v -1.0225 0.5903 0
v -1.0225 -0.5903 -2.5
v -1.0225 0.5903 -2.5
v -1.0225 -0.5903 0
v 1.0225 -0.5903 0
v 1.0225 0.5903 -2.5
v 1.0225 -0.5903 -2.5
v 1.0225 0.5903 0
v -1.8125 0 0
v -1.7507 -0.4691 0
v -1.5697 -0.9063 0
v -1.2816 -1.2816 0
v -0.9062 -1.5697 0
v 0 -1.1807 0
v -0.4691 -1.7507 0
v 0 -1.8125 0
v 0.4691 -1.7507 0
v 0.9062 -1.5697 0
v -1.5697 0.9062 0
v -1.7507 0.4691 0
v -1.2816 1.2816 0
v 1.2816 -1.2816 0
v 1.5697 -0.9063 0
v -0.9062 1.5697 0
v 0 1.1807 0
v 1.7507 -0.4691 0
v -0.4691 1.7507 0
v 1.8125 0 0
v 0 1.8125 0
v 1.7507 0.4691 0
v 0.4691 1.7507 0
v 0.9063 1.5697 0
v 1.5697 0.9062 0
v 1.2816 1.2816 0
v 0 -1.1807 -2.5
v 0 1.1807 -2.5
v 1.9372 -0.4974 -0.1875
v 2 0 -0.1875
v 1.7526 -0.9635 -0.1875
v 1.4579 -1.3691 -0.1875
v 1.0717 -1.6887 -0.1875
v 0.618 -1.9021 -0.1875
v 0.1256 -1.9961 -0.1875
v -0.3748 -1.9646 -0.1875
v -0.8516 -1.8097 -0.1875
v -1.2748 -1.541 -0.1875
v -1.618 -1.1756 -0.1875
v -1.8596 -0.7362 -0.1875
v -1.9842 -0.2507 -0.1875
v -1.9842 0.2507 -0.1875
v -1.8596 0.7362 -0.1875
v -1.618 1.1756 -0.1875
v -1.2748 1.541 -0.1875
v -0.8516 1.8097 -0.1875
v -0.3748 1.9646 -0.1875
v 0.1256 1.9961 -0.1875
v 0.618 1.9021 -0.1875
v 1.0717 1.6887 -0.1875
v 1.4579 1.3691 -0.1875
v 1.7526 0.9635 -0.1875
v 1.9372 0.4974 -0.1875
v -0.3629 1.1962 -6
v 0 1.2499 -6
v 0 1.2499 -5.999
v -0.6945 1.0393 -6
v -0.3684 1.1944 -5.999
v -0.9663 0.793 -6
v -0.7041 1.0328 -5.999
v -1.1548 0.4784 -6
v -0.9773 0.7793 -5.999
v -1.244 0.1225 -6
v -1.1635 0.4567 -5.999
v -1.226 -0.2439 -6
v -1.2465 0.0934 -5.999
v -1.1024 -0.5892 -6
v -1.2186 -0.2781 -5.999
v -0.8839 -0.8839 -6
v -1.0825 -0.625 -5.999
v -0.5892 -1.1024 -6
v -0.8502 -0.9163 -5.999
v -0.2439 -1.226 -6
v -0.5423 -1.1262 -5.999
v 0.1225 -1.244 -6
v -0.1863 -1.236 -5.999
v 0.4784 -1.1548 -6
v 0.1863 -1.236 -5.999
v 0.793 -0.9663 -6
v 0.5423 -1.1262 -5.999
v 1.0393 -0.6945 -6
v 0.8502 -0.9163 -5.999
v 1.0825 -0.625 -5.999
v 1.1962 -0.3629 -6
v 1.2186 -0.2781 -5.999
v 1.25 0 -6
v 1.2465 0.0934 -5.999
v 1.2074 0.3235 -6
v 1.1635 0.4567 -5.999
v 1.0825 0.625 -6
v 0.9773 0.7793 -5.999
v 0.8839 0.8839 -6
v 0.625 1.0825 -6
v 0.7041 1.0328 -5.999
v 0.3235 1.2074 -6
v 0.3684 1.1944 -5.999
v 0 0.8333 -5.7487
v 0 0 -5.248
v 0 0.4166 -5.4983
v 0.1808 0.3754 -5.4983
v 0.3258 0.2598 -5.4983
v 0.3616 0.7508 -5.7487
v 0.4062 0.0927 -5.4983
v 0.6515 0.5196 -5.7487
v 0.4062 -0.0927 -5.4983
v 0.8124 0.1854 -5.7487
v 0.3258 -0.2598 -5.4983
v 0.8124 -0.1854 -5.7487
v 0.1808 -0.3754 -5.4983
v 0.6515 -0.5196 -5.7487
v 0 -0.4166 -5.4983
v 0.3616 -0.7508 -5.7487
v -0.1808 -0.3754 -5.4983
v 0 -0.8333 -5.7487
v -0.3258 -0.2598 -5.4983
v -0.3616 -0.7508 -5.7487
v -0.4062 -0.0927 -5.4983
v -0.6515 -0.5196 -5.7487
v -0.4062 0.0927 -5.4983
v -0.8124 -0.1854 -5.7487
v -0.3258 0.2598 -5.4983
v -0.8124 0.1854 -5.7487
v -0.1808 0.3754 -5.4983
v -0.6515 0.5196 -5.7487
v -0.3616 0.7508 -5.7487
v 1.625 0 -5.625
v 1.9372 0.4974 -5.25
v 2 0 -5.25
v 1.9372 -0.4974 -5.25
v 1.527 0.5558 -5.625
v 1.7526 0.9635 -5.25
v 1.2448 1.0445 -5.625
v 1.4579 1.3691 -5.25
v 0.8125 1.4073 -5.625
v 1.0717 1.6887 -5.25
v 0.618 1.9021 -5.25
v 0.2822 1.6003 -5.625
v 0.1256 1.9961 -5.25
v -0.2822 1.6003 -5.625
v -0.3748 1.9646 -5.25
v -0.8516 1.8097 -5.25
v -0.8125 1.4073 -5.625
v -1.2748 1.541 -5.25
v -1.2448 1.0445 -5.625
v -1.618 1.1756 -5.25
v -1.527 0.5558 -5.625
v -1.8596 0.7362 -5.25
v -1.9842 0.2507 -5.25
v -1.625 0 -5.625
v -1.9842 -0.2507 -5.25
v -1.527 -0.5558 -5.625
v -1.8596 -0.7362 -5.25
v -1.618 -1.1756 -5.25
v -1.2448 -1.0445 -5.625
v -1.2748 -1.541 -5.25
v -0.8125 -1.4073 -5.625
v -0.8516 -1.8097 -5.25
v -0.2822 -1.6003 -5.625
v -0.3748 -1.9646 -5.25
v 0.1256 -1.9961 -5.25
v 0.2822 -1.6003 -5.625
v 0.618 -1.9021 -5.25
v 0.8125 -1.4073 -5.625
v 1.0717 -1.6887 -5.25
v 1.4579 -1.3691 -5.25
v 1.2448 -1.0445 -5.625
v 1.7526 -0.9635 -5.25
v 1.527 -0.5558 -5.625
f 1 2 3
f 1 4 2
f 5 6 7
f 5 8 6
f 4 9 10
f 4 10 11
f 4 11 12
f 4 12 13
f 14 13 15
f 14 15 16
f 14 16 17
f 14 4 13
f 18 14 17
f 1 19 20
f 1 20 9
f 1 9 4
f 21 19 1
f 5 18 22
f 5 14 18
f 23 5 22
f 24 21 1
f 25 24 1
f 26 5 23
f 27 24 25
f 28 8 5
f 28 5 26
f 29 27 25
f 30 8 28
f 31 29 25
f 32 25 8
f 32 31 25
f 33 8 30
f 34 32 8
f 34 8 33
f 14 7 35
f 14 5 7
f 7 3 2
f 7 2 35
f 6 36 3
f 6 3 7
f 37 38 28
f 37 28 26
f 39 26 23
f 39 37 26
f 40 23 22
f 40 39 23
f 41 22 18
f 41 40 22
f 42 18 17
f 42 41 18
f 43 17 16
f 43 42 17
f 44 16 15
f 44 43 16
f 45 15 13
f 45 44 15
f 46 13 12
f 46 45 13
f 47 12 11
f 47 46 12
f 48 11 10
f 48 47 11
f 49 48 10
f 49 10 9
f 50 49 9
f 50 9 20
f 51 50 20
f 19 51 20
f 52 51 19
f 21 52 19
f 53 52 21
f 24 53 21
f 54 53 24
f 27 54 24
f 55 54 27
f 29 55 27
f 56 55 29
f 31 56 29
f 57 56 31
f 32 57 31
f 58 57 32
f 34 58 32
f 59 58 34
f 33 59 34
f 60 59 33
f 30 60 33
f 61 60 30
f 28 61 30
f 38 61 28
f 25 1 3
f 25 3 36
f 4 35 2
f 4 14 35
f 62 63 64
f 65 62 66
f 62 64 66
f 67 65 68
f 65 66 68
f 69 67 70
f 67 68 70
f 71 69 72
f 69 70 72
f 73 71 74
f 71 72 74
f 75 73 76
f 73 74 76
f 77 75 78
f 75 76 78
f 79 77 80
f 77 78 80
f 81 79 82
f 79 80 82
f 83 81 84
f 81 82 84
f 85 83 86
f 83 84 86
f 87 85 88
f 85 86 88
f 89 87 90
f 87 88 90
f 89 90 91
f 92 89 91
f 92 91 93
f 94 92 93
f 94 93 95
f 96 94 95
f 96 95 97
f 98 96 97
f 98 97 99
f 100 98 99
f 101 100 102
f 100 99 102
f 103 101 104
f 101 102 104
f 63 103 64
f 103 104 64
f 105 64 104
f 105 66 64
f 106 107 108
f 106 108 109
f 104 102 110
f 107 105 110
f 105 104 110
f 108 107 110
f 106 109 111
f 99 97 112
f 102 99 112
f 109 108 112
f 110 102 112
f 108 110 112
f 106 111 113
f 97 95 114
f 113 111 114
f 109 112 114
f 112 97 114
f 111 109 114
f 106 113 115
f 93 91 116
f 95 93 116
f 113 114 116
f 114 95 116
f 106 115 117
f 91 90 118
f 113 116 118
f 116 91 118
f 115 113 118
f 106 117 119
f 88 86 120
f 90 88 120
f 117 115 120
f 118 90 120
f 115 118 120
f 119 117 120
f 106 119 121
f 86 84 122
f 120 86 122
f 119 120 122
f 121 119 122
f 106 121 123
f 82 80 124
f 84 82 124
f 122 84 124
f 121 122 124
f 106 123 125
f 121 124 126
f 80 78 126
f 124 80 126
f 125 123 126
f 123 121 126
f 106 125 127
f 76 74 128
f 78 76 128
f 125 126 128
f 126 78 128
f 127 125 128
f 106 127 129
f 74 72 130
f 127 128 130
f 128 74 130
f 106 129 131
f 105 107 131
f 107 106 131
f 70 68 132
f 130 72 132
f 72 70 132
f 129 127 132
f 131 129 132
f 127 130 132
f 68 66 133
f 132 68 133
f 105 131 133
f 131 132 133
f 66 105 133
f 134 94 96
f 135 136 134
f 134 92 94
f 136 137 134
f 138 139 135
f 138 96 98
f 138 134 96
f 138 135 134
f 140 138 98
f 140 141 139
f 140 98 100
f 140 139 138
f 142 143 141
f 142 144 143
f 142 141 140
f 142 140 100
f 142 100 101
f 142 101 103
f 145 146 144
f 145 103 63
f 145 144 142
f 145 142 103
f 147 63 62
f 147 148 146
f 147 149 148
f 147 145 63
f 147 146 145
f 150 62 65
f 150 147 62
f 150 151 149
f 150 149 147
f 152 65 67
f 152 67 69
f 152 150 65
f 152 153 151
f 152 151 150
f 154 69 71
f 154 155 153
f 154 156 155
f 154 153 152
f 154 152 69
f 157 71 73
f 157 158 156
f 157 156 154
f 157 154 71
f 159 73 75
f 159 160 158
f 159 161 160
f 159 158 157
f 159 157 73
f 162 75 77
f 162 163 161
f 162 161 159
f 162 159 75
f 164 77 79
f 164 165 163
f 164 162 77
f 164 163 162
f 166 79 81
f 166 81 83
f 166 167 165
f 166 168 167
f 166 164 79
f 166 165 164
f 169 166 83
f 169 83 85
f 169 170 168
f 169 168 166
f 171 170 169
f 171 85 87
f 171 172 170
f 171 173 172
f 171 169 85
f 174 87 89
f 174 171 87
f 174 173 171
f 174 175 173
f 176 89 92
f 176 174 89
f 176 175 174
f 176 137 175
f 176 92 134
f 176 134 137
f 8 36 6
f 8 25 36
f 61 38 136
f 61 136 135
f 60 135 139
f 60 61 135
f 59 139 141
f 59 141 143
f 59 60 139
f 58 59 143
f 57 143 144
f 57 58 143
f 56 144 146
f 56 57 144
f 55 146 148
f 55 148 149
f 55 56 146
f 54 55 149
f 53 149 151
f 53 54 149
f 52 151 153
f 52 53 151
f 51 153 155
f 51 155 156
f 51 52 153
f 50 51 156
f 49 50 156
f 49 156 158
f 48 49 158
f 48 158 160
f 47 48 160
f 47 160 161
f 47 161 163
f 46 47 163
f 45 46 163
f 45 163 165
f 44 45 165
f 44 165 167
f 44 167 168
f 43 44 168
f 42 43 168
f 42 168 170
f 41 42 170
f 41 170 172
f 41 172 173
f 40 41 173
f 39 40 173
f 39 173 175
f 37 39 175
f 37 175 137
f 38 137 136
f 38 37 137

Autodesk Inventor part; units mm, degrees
ref_plane "YZ Plane" through (0, 0, 0) normal (1, 0, 0) x (0, 1, 0)
ref_plane "XZ Plane" through (0, 0, 0) normal (0, 1, 0) x (-1, 0, 0)
ref_plane "XY Plane" through (0, 0, 0) normal (0, 0, 1) x (1, 0, 0)
sketch "Sketch3" plane through (0, 0, 0) normal (0, 0, 1) x (1, 0, 0)
  circle A0 centre (0, 0) radius 2 projected
  line L0 (1.0225, 0.5903) -> (1.0225, -0.5903)
  line L1 (1.0225, -0.5903) -> (0, -1.1807)
  line L2 (0, -1.1807) -> (-1.0225, -0.5903)
  line L3 (-1.0225, -0.5903) -> (-1.0225, 0.5903)
  line L4 (-1.0225, 0.5903) -> (0, 1.1807)
  line L5 (0, 1.1807) -> (1.0225, 0.5903)
  line L6 (0, 0) -> (0, 1.1807) construction
  dimension "HexWidth" = 2.045
sketch "Sketch2" plane through (0, 0, 0) normal (0, 0, 1) x (1, 0, 0)
  circle A0 centre (0, 0) radius 2
  dimension "Diam" = 4
extrude "Extrusion2" add sketch "Sketch2" against normal blind 6
thread "Thread1" size "M4x0.7" class "6g" standard "ANSI Metric M Profile" full length
extrude "Extrusion3" cut sketch "Sketch3" against normal blind 2.5 contours L0 L1 L2 L3 L4 L5
chamfer "Chamfer2" distance 0.75 angle 45 1 edges at (-2, 0, -6)
chamfer "Chamfer3" distance 0.1875 angle 45 1 edges at (-2, 0, 0)
sketch "Sketch4" plane through (0, 0, -6) normal (0, 0, -1) x (-1, 0, 0)
  circle A0 centre (0, 0) radius 1.8125 projected
hole "Cup_Point_Hole1" at (0, 0, -6) direction (0, 0, 1) diameter 2.4999 depth 0.001 tip angle 118
equation "\"d8\" = -0.5 * CupPointDiam + 0.5 * Diam"
equation "\"d11\" = 0.25 * d8"
equation "\"CupPointDiam\" = 2.5"
properties part number "SCREW,SET,CUP POINT,M4X0.7X6MM" material "Steel, MS"
